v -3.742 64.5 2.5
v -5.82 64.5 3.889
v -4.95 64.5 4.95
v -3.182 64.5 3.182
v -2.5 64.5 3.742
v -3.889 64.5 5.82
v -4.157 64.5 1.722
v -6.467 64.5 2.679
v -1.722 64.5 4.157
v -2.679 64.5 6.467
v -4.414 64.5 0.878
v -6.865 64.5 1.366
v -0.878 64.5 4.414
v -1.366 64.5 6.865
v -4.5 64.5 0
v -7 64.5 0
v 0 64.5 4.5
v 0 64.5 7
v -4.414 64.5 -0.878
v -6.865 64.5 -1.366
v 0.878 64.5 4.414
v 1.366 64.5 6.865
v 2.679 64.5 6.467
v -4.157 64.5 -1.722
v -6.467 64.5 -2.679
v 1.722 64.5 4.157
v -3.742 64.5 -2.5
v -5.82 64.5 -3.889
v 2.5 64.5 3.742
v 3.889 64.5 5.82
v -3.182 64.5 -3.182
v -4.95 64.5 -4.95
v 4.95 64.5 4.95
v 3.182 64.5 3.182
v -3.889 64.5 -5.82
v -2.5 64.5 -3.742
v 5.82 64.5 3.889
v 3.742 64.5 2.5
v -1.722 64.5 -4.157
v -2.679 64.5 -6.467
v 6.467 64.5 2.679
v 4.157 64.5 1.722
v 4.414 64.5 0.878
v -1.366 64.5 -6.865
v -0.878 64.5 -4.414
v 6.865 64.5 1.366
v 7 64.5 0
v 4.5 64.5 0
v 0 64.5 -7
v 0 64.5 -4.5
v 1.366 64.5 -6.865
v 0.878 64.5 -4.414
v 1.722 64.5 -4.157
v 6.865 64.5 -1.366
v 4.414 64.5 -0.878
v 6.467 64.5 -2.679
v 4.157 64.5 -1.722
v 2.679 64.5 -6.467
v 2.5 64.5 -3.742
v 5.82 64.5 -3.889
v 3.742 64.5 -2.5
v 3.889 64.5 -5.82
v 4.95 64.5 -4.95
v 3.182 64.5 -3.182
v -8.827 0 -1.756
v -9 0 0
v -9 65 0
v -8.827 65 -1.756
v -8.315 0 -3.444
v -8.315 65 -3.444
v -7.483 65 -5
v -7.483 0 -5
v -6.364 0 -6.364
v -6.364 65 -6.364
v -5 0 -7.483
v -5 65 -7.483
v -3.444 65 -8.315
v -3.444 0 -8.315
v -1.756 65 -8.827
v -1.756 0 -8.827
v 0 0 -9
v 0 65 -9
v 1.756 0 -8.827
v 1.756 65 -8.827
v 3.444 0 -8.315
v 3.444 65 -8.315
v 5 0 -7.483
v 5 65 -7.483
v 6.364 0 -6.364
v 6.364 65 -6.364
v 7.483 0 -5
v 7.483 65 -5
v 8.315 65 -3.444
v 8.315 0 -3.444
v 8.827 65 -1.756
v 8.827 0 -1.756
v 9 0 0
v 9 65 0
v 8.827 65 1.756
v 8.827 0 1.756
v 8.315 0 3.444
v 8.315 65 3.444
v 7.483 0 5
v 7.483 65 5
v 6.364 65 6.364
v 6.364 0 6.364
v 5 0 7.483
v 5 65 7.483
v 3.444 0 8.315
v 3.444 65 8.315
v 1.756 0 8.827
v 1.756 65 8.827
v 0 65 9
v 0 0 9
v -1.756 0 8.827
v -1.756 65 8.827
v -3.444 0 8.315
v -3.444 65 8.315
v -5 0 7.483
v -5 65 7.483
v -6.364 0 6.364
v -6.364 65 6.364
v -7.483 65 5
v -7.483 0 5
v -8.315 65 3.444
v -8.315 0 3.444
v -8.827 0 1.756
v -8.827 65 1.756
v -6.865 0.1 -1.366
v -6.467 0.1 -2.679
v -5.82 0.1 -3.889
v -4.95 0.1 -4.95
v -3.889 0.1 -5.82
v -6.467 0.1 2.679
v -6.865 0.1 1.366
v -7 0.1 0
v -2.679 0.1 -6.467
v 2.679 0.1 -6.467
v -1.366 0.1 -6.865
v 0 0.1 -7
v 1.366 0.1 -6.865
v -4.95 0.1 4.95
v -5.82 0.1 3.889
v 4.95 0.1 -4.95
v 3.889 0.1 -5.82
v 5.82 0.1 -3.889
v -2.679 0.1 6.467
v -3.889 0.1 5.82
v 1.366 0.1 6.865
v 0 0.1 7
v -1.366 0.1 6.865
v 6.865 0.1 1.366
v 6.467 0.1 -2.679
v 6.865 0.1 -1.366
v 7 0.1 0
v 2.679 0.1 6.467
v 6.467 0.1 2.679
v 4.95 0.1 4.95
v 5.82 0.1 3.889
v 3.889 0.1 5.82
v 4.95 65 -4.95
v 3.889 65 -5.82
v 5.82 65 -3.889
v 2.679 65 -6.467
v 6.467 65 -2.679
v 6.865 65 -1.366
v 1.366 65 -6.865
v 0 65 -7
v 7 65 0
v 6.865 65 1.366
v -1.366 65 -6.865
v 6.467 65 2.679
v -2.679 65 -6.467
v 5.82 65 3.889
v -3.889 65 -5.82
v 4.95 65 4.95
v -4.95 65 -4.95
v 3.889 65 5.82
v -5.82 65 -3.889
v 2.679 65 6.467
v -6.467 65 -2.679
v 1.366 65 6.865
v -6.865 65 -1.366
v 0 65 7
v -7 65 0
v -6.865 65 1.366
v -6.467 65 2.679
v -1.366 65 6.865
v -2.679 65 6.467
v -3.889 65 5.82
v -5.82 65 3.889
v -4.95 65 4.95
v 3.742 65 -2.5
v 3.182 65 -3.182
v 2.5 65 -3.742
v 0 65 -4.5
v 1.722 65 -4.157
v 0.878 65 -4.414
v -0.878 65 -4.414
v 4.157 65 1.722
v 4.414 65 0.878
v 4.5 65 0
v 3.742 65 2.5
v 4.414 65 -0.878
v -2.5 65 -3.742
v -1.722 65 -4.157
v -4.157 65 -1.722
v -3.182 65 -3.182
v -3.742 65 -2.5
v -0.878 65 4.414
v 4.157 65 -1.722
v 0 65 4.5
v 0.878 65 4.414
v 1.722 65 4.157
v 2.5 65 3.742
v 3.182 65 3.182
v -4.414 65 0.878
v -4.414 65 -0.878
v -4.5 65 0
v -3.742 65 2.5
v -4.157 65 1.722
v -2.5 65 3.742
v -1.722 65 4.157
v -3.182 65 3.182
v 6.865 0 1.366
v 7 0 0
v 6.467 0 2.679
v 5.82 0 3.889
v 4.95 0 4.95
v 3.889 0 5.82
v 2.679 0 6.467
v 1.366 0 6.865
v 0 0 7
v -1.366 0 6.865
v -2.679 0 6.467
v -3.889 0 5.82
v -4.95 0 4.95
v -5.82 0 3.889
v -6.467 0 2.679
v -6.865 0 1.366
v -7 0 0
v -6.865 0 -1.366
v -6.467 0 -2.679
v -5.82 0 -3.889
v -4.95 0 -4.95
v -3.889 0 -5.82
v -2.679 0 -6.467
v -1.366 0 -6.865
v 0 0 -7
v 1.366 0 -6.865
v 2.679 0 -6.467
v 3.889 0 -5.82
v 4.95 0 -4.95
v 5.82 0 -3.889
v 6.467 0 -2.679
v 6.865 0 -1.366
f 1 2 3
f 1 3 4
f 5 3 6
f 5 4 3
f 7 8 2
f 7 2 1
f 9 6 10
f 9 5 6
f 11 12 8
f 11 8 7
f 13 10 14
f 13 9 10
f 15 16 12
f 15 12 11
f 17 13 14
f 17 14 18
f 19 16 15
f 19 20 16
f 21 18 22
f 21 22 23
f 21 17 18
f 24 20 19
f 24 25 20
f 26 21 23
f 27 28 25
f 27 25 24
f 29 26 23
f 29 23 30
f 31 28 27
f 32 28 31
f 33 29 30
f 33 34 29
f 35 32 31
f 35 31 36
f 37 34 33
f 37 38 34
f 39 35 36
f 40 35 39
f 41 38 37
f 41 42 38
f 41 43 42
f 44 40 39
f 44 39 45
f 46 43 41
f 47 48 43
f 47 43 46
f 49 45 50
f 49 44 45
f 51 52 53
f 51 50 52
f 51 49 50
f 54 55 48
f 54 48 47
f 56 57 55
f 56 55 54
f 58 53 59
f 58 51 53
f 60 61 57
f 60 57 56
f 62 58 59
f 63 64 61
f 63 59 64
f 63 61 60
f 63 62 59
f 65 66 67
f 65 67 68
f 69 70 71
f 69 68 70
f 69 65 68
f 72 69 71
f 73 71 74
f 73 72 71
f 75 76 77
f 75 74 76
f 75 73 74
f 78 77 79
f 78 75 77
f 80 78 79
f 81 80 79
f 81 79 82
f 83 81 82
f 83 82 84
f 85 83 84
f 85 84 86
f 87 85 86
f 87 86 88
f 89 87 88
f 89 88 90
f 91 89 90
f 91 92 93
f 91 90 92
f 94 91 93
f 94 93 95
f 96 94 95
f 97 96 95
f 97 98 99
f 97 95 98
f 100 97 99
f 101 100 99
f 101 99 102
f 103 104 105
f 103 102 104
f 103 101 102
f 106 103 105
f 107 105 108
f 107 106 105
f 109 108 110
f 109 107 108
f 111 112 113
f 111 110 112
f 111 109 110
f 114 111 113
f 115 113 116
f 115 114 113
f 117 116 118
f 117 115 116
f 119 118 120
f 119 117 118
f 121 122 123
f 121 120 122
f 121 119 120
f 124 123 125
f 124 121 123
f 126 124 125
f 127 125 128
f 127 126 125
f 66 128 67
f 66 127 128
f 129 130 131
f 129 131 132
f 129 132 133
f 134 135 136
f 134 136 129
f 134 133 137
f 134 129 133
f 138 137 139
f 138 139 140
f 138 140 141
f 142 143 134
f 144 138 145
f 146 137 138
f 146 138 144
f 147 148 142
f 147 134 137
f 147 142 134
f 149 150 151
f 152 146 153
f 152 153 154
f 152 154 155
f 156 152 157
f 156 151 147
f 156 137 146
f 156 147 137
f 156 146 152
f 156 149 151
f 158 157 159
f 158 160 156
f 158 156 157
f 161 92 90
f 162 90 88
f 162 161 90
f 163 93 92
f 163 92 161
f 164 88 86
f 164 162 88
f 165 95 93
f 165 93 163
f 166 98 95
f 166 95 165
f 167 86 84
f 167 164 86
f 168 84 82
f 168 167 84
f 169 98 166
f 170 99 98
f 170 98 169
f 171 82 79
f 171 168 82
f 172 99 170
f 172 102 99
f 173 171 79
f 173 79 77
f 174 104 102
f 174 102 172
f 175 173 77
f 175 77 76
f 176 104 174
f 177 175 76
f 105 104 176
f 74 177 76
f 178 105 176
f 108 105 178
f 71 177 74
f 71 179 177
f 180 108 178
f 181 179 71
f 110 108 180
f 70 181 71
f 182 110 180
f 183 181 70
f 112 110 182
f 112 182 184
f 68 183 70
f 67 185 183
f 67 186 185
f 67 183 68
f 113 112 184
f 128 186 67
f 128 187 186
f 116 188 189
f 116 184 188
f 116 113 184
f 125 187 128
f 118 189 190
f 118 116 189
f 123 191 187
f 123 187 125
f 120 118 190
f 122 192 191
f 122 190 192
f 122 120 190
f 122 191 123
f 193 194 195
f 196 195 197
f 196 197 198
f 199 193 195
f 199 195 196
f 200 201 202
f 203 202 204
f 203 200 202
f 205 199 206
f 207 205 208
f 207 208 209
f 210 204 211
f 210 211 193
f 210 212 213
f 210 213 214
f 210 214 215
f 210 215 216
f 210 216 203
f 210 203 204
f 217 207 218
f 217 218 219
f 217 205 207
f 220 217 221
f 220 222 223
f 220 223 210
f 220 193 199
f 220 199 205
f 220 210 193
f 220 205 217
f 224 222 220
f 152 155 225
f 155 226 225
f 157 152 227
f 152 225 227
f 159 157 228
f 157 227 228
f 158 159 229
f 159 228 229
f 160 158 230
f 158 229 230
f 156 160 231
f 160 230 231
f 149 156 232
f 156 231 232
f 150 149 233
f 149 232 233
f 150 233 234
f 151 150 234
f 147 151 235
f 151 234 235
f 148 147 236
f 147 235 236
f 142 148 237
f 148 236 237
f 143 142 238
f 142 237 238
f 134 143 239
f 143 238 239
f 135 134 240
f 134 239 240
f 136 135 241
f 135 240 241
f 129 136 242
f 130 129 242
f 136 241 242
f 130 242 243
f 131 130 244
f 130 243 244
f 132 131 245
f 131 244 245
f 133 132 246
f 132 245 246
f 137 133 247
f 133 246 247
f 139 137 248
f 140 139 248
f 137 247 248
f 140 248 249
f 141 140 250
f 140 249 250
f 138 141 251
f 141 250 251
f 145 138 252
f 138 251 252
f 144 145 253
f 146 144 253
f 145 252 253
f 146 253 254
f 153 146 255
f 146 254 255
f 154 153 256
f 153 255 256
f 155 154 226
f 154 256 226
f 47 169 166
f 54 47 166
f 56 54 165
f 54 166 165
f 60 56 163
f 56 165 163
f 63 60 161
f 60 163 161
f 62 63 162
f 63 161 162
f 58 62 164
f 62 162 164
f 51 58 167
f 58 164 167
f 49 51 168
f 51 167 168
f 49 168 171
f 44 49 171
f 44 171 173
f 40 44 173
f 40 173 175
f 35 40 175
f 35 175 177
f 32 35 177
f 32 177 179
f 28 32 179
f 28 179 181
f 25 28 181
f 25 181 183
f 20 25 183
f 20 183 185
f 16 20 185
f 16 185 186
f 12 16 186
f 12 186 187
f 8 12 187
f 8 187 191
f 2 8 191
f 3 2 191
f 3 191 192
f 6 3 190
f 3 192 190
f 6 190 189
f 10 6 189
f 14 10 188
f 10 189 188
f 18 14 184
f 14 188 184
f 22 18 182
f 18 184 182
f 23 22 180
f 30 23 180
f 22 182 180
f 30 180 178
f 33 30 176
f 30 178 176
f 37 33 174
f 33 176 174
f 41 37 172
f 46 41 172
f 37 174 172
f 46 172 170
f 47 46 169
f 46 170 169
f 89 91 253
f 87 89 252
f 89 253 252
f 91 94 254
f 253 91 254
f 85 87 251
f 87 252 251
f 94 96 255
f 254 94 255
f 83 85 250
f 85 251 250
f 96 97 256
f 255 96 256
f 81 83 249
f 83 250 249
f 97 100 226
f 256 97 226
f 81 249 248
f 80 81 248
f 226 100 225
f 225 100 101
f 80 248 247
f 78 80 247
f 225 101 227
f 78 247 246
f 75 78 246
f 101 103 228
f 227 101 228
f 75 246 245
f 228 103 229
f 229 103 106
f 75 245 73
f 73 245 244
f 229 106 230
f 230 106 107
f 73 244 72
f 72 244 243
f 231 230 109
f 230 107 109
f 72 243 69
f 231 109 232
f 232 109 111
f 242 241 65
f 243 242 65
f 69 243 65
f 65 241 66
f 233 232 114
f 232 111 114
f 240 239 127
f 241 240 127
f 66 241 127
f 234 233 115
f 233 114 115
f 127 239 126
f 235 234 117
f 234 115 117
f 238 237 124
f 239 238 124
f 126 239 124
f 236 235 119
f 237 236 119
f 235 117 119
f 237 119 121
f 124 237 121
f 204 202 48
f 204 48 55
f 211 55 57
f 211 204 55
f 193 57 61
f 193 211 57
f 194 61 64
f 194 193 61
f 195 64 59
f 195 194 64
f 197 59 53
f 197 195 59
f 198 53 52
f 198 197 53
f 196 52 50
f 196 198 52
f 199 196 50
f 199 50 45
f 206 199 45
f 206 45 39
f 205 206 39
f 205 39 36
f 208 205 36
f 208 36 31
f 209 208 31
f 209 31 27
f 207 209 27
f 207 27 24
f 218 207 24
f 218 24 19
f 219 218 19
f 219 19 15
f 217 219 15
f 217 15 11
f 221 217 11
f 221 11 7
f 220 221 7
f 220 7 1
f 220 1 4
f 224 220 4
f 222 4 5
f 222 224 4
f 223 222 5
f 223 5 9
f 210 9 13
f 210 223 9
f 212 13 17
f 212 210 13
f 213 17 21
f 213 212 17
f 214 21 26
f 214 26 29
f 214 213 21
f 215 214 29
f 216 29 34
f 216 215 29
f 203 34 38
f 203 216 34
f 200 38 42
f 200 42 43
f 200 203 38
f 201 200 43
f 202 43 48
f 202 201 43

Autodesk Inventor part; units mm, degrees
ref_plane "YZ Plane" through (0, 0, 0) normal (1, 0, 0) x (0, 1, 0)
ref_plane "XZ Plane" through (0, 0, 0) normal (0, 1, 0) x (-1, 0, 0)
ref_plane "XY Plane" through (0, 0, 0) normal (0, 0, 1) x (1, 0, 0)
sketch "Boceto1" plane through (0, 0, 0) normal (0, 1, 0) x (-1, 0, 0)
  circle A0 centre (0, 0) radius 9
  dimension "d0" = 18
extrude "Extrusión1" add sketch "Boceto1" along normal blind 65
sketch "Boceto2" plane through (0, 65, 0) normal (0, 1, 0) x (1, 0, 0)
  circle A0 centre (0, 0) radius 4.5
  circle A1 centre (0, 0) radius 7
  dimension "d3" = 9
  dimension "d4" = 14
extrude "Extrusión2" cut sketch "Boceto2" against normal blind 0.5
sketch "Boceto3" plane through (0, 0, 0) normal (0, -1, 0) x (1, 0, 0)
  circle A0 centre (0, 0) radius 7
extrude "Extrusión3" cut sketch "Boceto3" against normal blind 0.1
properties part number "Batería"
